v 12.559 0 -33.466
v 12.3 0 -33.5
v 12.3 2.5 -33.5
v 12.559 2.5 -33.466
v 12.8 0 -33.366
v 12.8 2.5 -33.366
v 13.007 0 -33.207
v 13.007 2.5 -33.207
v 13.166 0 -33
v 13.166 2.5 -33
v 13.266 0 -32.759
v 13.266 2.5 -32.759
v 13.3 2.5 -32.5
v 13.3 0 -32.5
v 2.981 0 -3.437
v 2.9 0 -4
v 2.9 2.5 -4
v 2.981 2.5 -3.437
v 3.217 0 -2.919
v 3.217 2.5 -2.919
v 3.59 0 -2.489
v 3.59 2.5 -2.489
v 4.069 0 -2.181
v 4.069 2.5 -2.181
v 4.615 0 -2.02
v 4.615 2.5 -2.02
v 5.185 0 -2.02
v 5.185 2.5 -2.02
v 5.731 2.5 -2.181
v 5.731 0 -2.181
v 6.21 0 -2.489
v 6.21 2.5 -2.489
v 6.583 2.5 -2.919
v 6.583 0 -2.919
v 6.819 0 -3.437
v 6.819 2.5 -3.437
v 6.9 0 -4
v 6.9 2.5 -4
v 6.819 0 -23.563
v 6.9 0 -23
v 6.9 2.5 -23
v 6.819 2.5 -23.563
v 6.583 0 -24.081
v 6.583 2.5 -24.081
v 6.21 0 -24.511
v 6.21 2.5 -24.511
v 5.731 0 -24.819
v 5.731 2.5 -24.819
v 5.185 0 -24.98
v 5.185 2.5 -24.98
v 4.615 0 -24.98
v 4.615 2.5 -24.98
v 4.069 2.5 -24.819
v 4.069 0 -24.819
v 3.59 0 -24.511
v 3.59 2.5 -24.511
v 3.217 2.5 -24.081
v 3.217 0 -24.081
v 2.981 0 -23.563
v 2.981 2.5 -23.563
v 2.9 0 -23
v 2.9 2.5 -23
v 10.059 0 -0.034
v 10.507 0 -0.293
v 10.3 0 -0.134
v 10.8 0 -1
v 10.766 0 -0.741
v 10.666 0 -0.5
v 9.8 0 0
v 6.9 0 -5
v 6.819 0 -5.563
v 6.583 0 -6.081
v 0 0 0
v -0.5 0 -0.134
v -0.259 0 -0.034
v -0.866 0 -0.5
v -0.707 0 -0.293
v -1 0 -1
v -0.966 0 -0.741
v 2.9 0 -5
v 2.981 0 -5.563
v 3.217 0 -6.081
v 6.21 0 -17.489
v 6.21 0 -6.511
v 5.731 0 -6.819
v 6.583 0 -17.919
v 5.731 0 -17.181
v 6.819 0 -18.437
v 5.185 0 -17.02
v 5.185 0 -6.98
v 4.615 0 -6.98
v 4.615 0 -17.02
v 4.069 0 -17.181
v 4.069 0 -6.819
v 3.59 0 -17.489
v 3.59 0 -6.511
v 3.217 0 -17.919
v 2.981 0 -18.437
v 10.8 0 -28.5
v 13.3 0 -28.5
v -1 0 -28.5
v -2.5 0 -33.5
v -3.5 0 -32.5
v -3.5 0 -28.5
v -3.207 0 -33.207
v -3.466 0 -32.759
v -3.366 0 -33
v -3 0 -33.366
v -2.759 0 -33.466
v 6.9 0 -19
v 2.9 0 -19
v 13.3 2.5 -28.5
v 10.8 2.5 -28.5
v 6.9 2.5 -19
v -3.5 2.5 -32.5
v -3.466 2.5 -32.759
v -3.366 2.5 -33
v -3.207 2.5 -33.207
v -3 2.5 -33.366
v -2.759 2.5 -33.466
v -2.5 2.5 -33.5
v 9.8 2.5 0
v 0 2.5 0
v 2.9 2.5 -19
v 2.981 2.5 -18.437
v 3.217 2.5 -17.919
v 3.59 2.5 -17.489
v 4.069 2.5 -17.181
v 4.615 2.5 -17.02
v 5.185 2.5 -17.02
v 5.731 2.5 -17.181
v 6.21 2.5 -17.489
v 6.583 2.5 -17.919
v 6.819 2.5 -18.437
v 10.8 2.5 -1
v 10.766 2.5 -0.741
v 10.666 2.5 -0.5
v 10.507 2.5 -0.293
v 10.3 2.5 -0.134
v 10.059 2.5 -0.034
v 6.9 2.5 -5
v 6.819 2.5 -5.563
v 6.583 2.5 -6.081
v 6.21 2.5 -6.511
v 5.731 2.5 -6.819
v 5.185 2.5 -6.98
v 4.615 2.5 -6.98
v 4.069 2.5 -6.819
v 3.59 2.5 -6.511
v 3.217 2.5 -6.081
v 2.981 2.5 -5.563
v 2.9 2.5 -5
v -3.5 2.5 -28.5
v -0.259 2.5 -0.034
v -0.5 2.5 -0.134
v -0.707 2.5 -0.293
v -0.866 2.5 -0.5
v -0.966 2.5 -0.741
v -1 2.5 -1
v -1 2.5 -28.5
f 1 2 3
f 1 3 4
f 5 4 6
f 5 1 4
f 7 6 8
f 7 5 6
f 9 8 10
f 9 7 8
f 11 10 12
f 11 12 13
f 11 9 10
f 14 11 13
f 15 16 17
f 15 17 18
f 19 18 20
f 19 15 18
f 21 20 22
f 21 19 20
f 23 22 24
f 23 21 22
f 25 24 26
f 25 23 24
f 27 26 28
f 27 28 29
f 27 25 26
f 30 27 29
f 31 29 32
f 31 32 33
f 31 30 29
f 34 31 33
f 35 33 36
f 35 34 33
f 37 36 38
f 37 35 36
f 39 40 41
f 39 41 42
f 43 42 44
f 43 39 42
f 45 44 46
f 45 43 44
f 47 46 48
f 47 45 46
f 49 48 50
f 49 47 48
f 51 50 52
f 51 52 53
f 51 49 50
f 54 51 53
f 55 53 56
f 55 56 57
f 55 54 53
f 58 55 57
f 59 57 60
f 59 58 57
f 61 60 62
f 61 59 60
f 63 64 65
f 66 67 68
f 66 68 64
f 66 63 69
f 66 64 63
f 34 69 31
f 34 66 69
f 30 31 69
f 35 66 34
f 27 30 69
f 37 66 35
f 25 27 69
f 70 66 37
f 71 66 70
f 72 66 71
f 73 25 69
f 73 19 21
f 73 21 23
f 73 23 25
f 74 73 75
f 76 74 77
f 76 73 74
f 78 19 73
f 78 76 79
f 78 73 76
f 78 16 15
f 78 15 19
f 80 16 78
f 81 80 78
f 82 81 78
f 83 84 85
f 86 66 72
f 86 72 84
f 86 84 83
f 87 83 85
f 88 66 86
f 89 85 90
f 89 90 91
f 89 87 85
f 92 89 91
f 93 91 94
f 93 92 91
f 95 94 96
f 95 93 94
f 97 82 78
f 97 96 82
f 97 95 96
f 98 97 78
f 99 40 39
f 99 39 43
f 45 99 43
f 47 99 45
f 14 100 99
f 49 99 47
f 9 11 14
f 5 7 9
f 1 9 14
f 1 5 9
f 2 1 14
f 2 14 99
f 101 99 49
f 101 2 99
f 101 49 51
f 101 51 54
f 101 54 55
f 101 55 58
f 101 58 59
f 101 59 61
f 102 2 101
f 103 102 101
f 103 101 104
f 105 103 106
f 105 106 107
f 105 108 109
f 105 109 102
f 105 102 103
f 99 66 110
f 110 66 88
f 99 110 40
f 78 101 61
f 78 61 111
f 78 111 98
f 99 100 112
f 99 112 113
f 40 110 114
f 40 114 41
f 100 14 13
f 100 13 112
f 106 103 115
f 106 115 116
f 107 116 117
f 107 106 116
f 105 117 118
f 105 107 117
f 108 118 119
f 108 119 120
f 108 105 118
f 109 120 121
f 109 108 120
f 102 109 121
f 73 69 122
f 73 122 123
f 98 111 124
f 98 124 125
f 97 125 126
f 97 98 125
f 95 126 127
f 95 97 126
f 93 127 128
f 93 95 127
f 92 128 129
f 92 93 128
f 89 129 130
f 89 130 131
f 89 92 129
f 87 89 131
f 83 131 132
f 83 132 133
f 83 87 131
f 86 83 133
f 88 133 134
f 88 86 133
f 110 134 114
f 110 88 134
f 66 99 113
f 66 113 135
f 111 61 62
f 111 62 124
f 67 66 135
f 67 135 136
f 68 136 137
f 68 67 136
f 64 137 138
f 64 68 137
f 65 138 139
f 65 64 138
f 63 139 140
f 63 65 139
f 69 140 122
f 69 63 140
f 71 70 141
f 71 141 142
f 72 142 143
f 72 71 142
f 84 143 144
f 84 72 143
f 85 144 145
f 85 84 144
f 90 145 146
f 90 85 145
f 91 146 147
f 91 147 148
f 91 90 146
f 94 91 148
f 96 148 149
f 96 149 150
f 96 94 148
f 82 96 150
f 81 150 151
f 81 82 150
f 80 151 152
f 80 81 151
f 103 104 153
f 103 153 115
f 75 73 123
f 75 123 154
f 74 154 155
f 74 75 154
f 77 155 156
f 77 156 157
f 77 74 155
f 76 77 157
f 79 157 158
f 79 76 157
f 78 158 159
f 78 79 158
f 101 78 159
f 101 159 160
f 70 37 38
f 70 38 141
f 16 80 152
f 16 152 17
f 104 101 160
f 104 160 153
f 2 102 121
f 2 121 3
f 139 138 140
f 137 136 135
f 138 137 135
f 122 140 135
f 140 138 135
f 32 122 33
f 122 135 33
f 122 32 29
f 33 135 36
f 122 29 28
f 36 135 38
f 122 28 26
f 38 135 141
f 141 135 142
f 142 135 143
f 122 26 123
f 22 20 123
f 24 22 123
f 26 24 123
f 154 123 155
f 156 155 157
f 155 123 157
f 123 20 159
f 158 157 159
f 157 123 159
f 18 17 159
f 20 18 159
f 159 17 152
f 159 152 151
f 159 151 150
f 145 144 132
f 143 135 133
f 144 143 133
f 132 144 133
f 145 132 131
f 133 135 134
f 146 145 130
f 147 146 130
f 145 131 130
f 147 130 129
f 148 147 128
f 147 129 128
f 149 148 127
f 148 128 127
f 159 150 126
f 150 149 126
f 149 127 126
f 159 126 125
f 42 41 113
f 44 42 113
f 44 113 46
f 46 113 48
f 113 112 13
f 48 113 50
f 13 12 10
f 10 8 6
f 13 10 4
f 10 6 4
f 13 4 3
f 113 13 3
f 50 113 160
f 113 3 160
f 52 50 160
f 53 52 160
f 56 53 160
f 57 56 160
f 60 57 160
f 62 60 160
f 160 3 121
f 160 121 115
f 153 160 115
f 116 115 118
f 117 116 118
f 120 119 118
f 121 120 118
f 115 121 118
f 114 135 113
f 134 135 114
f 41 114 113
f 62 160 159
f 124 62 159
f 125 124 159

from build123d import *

# Parameters (mm, degrees)
SALIENTE_EXTRUIR1_DEPTH = 2.5


with BuildPart() as part:
    # Croquis1 → Saliente-Extruir1 (new body)
    with BuildSketch(Plane(origin=(0, 0, 0), x_dir=(1, 0, 0), z_dir=(0, 1, 0))):
        with BuildLine():
            Line((-2.5, 33.5), (12.3, 33.5))
            ThreePointArc((12.3, 33.5), (13.007106781, 33.207106781), (13.3, 32.5))
            Line((13.3, 32.5), (13.3, 28.5))
            Line((13.3, 28.5), (10.8, 28.5))
            Line((10.8, 28.5), (10.8, 1))
            ThreePointArc((10.8, 1), (10.507106781, 0.292893219), (9.8, 0))
            Line((9.8, 0), (0, 0))
            ThreePointArc((0, 0), (-0.707106781, 0.292893219), (-1, 1))
            Line((-1, 1), (-1, 28.5))
            Line((-1, 28.5), (-3.5, 28.5))
            Line((-3.5, 28.5), (-3.5, 32.5))
            ThreePointArc((-3.5, 32.5), (-3.207106781, 33.207106781), (-2.5, 33.5))
        make_face()
        with BuildLine():
            ThreePointArc((6.9, 23), (4.9, 25), (2.9, 23))
            Line((2.9, 23), (2.9, 19))
            ThreePointArc((2.9, 19), (4.9, 17), (6.9, 19))
            Line((6.9, 19), (6.9, 23))
        make_face(mode=Mode.SUBTRACT)
        with BuildLine():
            ThreePointArc((6.9, 5), (4.9, 7), (2.9, 5))
            Line((2.9, 5), (2.9, 4))
            ThreePointArc((2.9, 4), (4.9, 2), (6.9, 4))
            Line((6.9, 4), (6.9, 5))
        make_face(mode=Mode.SUBTRACT)
    extrude(amount=SALIENTE_EXTRUIR1_DEPTH)


solid = part.part
